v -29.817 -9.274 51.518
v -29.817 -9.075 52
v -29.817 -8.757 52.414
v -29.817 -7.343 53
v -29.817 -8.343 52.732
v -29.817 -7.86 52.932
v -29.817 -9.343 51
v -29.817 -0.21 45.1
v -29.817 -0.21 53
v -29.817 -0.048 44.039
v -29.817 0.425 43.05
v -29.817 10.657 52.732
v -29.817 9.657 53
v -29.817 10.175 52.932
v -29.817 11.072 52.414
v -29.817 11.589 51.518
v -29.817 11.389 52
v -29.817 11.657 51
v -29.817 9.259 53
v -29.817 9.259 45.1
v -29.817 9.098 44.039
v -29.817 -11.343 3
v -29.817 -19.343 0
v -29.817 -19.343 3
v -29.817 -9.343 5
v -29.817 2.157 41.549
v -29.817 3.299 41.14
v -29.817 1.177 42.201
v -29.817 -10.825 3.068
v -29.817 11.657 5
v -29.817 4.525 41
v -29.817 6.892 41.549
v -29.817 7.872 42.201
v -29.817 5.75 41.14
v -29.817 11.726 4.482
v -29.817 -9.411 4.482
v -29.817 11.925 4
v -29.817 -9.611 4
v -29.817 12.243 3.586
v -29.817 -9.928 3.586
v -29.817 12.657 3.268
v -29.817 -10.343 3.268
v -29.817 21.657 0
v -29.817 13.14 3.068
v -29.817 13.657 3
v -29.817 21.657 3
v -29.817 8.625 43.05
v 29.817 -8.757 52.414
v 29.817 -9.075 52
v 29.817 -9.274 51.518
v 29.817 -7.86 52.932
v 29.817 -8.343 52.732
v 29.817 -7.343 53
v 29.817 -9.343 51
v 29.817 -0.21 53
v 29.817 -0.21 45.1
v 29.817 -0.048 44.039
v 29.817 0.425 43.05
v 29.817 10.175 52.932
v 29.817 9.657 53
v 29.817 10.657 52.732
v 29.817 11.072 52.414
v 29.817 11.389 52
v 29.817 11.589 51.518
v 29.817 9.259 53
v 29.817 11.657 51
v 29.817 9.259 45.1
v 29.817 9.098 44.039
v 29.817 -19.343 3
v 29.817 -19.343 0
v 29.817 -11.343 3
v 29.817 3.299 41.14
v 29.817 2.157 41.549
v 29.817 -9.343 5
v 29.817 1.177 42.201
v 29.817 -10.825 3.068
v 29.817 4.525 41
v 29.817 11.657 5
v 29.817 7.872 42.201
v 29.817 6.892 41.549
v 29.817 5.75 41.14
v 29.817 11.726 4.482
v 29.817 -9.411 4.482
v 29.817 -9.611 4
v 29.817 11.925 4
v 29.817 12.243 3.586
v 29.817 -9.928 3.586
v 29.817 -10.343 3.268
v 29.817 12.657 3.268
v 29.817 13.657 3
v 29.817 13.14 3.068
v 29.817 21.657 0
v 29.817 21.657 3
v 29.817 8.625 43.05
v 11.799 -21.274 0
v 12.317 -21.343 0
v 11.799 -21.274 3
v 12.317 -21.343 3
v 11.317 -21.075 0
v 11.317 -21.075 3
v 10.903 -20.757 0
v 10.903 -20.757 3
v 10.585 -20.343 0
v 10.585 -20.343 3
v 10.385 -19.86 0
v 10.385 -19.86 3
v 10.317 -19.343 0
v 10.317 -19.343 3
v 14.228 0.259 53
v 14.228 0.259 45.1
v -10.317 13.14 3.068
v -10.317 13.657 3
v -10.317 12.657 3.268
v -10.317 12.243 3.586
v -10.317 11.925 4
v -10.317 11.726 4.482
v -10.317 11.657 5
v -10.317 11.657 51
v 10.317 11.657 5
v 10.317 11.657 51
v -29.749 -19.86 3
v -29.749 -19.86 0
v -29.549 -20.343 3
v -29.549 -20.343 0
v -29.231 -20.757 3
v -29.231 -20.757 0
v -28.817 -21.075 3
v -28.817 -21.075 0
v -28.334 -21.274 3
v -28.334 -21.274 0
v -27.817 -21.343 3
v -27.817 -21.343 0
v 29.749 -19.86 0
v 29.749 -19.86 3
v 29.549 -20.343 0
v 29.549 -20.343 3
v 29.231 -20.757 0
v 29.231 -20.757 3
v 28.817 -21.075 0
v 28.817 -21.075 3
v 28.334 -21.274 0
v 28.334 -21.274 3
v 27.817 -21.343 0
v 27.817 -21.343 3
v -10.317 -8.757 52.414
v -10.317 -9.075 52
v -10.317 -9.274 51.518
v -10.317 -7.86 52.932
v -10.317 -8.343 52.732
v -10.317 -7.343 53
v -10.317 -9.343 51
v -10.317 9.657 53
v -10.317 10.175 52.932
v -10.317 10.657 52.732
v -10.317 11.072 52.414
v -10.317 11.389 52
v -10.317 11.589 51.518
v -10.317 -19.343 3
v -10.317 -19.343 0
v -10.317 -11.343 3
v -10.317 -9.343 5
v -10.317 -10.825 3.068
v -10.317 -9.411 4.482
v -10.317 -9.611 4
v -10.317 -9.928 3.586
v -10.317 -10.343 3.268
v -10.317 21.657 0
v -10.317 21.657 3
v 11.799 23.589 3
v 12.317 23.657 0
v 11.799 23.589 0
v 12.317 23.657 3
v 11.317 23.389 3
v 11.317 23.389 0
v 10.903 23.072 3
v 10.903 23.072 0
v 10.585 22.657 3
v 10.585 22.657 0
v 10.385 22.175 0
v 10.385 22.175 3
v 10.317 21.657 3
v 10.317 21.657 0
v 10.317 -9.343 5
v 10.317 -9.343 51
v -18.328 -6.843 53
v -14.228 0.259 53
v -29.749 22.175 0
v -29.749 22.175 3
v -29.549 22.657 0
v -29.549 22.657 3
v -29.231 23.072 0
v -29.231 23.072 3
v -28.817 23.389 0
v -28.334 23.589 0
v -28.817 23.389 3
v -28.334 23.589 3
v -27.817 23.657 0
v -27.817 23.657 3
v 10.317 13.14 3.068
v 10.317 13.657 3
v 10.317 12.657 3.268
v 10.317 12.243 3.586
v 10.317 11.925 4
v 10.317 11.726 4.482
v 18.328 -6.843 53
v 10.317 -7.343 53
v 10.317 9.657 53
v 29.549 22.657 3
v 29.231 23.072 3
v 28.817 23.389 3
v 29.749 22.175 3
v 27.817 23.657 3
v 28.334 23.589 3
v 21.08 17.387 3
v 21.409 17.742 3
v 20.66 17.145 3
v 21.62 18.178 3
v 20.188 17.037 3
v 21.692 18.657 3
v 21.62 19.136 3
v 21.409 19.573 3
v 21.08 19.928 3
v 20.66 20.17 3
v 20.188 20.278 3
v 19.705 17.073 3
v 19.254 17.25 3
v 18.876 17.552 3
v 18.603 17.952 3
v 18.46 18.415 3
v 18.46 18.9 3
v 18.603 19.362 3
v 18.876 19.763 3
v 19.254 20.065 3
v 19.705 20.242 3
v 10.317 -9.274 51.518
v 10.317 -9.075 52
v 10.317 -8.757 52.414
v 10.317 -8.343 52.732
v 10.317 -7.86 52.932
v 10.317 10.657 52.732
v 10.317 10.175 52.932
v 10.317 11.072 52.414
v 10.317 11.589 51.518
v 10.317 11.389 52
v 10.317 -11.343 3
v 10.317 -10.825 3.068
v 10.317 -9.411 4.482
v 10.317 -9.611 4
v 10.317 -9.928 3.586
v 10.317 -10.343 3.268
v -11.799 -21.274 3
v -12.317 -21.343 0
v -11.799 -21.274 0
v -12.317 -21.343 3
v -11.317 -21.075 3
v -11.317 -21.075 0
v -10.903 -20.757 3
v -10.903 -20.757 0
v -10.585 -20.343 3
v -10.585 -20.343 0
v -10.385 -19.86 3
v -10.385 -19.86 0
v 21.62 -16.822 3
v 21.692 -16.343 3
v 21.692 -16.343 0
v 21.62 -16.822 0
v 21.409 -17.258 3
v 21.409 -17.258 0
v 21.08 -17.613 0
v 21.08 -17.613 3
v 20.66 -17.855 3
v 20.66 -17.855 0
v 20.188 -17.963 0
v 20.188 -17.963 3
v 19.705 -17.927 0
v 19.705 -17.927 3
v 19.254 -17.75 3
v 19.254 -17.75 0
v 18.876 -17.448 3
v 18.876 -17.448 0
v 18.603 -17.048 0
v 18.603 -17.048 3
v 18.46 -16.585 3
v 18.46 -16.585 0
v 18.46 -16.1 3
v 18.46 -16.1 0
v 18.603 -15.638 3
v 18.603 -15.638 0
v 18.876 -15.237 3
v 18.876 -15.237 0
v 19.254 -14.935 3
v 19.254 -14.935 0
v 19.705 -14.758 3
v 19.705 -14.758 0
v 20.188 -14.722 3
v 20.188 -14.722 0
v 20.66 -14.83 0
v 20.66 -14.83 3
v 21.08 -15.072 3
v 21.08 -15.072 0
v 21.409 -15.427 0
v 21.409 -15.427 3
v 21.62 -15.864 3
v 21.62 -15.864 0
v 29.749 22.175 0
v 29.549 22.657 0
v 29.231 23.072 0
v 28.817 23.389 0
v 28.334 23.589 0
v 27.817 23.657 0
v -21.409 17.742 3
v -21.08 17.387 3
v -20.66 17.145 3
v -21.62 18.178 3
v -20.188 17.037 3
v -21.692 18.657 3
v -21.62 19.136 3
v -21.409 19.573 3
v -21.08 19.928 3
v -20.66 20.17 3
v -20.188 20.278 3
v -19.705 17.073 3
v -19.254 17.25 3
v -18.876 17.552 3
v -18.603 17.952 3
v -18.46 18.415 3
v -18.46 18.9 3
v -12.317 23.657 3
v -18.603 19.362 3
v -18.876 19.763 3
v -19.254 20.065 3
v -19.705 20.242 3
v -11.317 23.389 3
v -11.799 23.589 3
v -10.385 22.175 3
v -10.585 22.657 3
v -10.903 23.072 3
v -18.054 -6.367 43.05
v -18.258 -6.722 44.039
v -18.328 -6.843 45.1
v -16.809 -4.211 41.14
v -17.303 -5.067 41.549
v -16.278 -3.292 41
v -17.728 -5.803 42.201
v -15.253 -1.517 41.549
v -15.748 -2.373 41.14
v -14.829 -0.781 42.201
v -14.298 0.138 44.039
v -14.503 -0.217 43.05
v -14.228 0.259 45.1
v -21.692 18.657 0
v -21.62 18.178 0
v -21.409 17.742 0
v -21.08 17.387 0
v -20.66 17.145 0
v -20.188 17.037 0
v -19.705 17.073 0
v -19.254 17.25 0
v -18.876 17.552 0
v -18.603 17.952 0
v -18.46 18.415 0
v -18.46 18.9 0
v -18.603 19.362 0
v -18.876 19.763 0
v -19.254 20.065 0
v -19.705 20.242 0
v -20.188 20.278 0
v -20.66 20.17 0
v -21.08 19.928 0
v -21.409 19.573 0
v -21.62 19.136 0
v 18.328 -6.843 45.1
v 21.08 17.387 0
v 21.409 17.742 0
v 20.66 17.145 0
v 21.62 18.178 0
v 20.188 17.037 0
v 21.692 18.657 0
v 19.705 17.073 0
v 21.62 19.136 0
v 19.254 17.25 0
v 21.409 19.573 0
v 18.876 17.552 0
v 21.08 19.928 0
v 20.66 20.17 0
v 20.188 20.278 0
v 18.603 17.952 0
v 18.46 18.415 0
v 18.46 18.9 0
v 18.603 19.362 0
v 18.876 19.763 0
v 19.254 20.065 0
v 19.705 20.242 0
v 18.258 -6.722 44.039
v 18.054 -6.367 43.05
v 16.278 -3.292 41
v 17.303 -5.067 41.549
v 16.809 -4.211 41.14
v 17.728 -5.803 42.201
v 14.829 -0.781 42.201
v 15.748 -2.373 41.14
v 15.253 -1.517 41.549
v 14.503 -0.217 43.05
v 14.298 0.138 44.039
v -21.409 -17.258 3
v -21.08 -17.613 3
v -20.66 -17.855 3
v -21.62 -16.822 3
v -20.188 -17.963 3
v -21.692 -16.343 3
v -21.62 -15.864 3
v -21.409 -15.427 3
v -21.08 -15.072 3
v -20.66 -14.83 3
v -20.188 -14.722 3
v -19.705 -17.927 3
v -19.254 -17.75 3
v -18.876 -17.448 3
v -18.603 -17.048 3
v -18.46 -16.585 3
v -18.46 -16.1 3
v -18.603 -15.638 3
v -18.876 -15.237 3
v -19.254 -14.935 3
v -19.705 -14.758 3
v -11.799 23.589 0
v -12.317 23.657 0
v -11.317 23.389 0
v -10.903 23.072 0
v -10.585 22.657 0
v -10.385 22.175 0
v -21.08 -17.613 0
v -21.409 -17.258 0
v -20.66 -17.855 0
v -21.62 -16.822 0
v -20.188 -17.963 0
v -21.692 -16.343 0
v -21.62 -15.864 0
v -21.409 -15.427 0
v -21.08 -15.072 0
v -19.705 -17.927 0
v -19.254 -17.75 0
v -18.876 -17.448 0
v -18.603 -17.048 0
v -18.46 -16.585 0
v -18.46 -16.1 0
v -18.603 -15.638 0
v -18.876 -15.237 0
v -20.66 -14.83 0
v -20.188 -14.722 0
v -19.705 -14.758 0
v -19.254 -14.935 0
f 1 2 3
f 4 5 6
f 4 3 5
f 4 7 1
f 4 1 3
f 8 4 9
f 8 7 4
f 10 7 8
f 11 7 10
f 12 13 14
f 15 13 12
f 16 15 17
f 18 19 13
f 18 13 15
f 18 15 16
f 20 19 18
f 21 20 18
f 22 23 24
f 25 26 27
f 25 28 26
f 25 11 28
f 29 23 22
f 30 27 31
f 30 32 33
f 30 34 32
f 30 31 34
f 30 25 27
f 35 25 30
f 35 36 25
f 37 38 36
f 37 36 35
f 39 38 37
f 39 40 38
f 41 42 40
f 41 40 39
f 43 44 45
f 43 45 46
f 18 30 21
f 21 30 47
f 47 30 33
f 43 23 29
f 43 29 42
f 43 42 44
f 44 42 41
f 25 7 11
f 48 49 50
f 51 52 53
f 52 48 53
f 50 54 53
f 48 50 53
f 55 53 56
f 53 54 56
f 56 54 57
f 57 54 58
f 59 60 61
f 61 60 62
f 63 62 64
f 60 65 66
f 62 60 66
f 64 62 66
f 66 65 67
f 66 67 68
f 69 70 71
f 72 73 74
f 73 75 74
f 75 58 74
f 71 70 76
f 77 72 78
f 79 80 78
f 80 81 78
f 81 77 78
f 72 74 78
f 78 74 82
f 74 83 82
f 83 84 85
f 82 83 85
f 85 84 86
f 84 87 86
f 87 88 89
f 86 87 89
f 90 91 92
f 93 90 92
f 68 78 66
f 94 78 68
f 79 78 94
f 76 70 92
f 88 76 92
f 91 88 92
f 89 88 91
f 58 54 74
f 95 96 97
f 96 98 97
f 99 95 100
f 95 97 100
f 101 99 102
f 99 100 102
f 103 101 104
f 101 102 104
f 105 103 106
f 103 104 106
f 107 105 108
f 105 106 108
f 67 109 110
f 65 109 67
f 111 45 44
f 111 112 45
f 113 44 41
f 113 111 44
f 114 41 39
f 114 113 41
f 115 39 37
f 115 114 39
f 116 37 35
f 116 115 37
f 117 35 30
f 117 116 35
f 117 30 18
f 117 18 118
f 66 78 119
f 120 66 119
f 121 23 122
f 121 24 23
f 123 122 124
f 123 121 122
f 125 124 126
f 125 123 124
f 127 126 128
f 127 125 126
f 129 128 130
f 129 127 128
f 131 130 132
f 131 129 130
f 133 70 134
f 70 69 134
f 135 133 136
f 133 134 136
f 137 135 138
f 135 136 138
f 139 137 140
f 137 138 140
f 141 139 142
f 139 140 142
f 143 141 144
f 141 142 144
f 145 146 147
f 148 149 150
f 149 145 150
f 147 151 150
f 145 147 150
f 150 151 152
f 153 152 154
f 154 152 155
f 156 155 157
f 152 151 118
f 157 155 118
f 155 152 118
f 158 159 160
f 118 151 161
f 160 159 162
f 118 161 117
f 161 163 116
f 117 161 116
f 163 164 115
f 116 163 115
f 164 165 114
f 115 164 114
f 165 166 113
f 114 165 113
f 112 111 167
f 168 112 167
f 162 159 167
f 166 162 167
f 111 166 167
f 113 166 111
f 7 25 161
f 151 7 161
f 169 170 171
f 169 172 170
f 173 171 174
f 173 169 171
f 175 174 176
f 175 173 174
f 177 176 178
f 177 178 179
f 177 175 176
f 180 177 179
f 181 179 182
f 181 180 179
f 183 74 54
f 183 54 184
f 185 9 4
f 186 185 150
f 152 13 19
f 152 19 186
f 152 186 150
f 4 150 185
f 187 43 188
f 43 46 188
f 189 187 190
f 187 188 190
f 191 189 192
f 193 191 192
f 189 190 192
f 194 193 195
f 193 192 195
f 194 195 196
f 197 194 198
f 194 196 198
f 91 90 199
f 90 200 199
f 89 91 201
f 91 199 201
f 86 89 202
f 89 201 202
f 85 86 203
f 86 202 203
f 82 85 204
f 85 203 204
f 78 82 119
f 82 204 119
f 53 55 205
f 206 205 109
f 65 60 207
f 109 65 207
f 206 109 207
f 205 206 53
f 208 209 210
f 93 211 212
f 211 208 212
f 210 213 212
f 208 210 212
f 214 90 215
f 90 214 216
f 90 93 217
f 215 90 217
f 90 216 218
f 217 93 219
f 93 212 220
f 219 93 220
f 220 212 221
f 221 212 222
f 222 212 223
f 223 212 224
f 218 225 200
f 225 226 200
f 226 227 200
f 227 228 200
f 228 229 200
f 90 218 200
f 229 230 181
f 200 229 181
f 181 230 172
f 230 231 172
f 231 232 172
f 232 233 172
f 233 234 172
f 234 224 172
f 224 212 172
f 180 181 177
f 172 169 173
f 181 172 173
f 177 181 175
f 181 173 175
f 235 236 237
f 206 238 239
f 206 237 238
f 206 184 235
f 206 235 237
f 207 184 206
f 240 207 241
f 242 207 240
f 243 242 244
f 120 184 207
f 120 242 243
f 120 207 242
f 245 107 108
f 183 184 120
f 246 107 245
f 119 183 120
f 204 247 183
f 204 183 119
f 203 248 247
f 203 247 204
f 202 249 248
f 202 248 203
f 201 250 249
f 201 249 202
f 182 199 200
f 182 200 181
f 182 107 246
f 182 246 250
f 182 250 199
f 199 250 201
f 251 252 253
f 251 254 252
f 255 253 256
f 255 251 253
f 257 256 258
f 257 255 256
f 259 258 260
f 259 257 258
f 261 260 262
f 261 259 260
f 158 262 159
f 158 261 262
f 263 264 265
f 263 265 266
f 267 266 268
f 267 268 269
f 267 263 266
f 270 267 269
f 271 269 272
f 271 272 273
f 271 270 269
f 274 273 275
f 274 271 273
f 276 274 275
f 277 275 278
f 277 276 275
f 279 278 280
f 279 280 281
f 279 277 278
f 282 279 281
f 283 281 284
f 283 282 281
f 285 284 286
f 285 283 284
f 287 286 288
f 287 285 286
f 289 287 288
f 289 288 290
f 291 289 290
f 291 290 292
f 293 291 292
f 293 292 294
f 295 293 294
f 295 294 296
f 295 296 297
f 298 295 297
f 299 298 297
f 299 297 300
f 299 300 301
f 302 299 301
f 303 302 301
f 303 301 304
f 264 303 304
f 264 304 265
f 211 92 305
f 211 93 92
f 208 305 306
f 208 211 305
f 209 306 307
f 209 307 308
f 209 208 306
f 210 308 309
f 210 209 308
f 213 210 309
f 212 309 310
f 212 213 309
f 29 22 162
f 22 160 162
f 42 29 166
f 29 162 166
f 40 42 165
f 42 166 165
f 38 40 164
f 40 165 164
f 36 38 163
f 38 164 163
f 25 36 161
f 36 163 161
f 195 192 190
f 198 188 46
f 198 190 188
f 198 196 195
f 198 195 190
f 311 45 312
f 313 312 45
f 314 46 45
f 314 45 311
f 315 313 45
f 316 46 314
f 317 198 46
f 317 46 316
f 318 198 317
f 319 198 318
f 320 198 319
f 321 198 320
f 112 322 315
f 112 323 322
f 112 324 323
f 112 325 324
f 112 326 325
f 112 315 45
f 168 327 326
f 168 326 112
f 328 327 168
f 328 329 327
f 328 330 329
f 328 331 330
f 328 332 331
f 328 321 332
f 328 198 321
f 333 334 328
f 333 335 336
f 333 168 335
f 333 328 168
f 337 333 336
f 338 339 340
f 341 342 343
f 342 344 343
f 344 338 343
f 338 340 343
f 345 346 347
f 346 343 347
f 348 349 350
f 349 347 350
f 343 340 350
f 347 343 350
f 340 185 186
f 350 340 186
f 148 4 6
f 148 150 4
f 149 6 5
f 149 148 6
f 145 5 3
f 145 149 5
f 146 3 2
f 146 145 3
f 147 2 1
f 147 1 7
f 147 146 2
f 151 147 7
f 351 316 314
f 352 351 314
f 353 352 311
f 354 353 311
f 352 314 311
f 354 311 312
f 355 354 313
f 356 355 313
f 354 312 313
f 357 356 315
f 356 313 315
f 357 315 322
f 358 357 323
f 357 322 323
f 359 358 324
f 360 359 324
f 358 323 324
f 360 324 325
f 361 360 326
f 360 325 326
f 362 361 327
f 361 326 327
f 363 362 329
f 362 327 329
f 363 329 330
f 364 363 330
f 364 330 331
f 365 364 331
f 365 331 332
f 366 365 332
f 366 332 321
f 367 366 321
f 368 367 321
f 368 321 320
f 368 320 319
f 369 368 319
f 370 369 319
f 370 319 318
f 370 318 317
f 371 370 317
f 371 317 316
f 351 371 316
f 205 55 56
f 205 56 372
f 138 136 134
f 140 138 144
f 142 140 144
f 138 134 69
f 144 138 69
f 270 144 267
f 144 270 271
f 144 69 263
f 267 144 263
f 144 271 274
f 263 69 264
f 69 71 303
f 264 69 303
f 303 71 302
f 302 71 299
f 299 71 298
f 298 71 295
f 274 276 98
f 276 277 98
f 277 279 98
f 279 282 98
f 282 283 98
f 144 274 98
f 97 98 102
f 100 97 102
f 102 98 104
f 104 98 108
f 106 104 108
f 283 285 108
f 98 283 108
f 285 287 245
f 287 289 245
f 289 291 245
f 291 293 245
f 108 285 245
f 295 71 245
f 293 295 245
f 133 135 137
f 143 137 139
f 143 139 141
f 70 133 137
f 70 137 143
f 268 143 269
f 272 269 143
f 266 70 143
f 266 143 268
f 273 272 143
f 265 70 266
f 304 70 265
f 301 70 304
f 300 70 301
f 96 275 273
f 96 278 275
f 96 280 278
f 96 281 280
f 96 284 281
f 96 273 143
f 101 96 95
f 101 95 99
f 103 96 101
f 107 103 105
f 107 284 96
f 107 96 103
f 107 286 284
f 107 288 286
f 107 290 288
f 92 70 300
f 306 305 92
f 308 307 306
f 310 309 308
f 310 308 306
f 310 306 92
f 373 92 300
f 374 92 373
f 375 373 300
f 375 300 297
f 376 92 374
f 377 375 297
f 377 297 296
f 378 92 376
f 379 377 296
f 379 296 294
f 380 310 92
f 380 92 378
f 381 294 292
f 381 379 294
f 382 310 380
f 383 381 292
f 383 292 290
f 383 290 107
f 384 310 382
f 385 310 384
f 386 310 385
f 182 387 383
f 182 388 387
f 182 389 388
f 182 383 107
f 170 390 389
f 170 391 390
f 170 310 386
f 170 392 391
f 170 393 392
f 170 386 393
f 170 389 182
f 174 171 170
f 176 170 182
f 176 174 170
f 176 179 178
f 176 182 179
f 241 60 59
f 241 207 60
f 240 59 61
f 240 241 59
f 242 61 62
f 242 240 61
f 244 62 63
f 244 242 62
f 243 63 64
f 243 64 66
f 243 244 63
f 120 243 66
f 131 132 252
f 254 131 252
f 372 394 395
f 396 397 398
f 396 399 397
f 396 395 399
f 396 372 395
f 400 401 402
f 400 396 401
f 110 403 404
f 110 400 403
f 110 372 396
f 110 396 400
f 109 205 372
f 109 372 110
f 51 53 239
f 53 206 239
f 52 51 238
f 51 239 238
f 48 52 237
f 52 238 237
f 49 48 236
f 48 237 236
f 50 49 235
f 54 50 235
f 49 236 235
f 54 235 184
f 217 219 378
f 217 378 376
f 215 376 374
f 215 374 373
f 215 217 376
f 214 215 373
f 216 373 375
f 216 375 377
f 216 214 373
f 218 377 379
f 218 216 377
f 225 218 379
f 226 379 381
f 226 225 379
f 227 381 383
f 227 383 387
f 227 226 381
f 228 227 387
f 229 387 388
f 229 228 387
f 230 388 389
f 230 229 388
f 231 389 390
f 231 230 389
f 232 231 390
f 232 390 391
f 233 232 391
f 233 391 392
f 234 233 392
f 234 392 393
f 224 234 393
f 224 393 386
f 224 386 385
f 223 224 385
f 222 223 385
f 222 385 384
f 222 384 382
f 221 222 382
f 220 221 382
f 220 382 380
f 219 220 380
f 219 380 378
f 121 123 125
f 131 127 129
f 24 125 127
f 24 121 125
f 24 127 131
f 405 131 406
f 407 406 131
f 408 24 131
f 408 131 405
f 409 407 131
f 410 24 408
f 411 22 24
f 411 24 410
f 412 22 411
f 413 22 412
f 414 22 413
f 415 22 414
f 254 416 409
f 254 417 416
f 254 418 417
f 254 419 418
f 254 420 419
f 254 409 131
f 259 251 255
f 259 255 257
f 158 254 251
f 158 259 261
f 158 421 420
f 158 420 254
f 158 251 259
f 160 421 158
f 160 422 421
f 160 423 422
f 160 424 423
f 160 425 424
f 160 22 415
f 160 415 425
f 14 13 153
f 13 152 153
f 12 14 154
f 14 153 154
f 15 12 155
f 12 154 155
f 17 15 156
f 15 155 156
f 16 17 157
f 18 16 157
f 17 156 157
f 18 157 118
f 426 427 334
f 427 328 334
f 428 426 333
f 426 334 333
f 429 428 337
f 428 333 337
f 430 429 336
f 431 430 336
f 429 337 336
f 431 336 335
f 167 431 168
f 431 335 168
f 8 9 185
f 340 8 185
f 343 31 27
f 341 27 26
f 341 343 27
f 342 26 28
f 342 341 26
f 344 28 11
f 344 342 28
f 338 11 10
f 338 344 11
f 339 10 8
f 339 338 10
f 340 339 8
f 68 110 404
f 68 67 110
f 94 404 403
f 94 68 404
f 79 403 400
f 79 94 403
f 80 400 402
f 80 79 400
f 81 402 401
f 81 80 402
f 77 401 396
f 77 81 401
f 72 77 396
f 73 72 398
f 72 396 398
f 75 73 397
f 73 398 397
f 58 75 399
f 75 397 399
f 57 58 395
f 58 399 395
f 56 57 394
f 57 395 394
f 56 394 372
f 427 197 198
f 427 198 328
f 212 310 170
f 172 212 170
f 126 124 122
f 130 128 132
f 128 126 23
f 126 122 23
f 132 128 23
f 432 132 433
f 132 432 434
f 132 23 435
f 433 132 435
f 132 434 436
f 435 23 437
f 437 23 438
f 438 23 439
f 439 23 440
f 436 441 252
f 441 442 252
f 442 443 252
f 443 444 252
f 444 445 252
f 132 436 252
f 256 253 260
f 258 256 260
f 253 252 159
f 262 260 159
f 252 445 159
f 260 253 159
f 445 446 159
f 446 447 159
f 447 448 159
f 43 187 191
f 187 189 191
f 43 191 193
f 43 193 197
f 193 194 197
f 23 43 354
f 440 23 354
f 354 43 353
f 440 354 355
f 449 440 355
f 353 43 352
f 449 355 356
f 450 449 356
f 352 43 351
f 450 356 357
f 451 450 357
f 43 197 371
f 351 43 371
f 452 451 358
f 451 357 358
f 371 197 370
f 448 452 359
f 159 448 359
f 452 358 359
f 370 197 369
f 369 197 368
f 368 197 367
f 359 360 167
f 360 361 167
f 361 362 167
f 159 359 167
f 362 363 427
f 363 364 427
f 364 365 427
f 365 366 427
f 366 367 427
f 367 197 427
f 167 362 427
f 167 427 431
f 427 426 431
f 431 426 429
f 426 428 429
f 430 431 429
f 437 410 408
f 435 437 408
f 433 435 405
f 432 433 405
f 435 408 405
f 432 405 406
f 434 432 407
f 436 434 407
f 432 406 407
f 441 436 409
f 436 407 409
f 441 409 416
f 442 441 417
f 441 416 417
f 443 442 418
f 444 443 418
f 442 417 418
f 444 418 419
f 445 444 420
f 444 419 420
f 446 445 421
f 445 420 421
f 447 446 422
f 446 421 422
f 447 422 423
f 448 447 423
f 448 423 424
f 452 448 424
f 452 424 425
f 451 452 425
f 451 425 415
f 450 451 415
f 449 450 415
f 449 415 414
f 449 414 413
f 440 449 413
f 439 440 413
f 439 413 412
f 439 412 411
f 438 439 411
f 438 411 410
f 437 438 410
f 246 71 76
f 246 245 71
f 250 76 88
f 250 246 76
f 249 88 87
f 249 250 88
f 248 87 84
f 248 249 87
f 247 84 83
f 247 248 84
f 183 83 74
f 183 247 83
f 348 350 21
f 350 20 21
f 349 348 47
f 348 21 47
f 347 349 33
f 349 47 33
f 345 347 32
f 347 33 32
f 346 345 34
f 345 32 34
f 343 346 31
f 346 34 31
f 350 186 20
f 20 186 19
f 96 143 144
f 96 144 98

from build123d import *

# Parameters (mm, degrees)
F0_W     = 19.5
F0_H     = 45
F1_DEPTH = 3
F2_D     = 3.25
F3_D     = 3.25
F4_W     = 19.5
F4_H     = 21
F5_DEPTH = 50
F6_R     = 2
F7_R     = 2
F9_DEPTH = 12
F10_R    = 4.09999
F11_R    = 2


# Not quite as in the source:
# - a fillet or chamfer is up to 0.001 mm smaller than in the source, because OpenCascade refuses the exact size


with BuildPart() as f1:
    # F0 (on Top) → F1 (new body)
    with BuildSketch(Plane.XY):
        with Locations((-20.0667725876, 1.1574134253)):
            Rectangle(F0_W, F0_H)
    extrude(amount=F1_DEPTH)

    # F2 (through all)
    with Locations(Plane(origin=(0, 0, 0), x_dir=(1, 0, 0), z_dir=(0, 0, -1))):
        with Locations((-20.0667725876, 16.3425865747)):
            Hole(F2_D / 2)

    # F3 (through all)
    with Locations(Plane(origin=(0, 0, 0), x_dir=(1, 0, 0), z_dir=(0, 0, -1))):
        with Locations((-20.0667725876, -18.6574134253)):
            Hole(F3_D / 2)

    # F4 (on face) → F5 (join)
    with BuildSketch(Plane.XY.offset(3)):
        with Locations((-20.0667725876, 1.1574134253)):
            Rectangle(F4_W, F4_H)
    extrude(amount=F5_DEPTH)

    # F6
    f6_edges = [f1.edges().sort_by_distance(p)[0] for p in [
        (-20.066773, -9.342587, 3),
        (-20.066773, 11.657413, 3),
    ]]
    fillet(f6_edges, radius=F6_R)

    # F7
    f7_edges = [f1.edges().sort_by_distance(p)[0] for p in [
        (-10.316773, -21.342587, 1.5),
        (-29.816773, -21.342587, 1.5),
        (-10.316773, 23.657413, 1.5),
        (-29.816773, 23.657413, 1.5),
    ]]
    fillet(f7_edges, radius=F7_R)

    # F8 (on face) → F9 (cut)
    with BuildSketch(Plane.XY.offset(53)):
        Polygon((-14.2283153195, 0.2588217364), (-29.8167725876, 9.2588217364), (-29.8167725876, -0.2097226783), (-18.3283153195, -6.8425865747), align=None)
    extrude(amount=-F9_DEPTH, mode=Mode.SUBTRACT)

    # F10 (radius 4.1 in the source; OpenCascade refuses exactly that, so slightly less here)
    f10_edges = [f1.edges().sort_by_distance(p)[0] for p in [
        (-22.022544, 4.758822, 41),
        (-24.072544, -3.526155, 41),
    ]]
    fillet(f10_edges, radius=F10_R)

    # F11
    f11_edges = [f1.edges().sort_by_distance(p)[0] for p in [
        (-20.066773, -9.342587, 53),
        (-20.066773, 11.657413, 53),
    ]]
    fillet(f11_edges, radius=F11_R)


with BuildPart() as f12_1:
    # F12: instance of F1
    add(f1.part.mirror(Plane.YZ))


solid = Compound([f1.part, f12_1.part])
